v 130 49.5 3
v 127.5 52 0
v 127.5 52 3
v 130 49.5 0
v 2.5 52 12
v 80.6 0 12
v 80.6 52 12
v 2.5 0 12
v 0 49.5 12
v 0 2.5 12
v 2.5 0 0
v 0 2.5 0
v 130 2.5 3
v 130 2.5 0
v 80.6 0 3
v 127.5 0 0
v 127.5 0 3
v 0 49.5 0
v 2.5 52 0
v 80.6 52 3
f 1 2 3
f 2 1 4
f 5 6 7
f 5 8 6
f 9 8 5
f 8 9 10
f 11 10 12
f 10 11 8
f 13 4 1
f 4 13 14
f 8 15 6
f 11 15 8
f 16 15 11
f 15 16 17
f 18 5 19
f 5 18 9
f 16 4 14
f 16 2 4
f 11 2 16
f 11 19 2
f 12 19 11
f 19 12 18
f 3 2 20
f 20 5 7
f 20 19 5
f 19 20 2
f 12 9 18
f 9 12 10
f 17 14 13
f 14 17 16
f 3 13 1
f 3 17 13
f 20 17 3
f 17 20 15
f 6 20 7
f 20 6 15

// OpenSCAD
$fn = 32;

// ----------------------------------------------------------------------
// Stepped bar: endstep, 130 x 52 x 12/3 mm
// ----------------------------------------------------------------------

// --- parameters (mm) ---
bar_l = 130;              // bar length, X
bar_w = 52;               // bar width, Y
plate_t = 12;             // thickness of the thick zone, Z
thin_t = 3;               // thickness of the thin zone
corner_c = 2.5;           // corner chamfer of the bar
step_cut = 9;             // material removed from the thin zone
step_x = 80.6;            // step position from the left end
depth_1 = 9;              // depth of cut 1 from the top face

profile = [[2.5, 0], [127.5, 0], [130, 2.5], [130, 49.5], [127.5, 52], [2.5, 52], [0, 49.5], [0, 2.5]];  // primary outline, 8 points, counter clockwise
void_1 = [[80.6, -1], [131, -1], [131, 53], [80.6, 53]];  // thin zone beyond the step, 4 points

// --- the one profile operation ---
difference() {
  linear_extrude(height = plate_t) polygon(points = profile);
  translate([0, 0, plate_t - depth_1])
    linear_extrude(height = depth_1 + 1) polygon(points = void_1);
}
